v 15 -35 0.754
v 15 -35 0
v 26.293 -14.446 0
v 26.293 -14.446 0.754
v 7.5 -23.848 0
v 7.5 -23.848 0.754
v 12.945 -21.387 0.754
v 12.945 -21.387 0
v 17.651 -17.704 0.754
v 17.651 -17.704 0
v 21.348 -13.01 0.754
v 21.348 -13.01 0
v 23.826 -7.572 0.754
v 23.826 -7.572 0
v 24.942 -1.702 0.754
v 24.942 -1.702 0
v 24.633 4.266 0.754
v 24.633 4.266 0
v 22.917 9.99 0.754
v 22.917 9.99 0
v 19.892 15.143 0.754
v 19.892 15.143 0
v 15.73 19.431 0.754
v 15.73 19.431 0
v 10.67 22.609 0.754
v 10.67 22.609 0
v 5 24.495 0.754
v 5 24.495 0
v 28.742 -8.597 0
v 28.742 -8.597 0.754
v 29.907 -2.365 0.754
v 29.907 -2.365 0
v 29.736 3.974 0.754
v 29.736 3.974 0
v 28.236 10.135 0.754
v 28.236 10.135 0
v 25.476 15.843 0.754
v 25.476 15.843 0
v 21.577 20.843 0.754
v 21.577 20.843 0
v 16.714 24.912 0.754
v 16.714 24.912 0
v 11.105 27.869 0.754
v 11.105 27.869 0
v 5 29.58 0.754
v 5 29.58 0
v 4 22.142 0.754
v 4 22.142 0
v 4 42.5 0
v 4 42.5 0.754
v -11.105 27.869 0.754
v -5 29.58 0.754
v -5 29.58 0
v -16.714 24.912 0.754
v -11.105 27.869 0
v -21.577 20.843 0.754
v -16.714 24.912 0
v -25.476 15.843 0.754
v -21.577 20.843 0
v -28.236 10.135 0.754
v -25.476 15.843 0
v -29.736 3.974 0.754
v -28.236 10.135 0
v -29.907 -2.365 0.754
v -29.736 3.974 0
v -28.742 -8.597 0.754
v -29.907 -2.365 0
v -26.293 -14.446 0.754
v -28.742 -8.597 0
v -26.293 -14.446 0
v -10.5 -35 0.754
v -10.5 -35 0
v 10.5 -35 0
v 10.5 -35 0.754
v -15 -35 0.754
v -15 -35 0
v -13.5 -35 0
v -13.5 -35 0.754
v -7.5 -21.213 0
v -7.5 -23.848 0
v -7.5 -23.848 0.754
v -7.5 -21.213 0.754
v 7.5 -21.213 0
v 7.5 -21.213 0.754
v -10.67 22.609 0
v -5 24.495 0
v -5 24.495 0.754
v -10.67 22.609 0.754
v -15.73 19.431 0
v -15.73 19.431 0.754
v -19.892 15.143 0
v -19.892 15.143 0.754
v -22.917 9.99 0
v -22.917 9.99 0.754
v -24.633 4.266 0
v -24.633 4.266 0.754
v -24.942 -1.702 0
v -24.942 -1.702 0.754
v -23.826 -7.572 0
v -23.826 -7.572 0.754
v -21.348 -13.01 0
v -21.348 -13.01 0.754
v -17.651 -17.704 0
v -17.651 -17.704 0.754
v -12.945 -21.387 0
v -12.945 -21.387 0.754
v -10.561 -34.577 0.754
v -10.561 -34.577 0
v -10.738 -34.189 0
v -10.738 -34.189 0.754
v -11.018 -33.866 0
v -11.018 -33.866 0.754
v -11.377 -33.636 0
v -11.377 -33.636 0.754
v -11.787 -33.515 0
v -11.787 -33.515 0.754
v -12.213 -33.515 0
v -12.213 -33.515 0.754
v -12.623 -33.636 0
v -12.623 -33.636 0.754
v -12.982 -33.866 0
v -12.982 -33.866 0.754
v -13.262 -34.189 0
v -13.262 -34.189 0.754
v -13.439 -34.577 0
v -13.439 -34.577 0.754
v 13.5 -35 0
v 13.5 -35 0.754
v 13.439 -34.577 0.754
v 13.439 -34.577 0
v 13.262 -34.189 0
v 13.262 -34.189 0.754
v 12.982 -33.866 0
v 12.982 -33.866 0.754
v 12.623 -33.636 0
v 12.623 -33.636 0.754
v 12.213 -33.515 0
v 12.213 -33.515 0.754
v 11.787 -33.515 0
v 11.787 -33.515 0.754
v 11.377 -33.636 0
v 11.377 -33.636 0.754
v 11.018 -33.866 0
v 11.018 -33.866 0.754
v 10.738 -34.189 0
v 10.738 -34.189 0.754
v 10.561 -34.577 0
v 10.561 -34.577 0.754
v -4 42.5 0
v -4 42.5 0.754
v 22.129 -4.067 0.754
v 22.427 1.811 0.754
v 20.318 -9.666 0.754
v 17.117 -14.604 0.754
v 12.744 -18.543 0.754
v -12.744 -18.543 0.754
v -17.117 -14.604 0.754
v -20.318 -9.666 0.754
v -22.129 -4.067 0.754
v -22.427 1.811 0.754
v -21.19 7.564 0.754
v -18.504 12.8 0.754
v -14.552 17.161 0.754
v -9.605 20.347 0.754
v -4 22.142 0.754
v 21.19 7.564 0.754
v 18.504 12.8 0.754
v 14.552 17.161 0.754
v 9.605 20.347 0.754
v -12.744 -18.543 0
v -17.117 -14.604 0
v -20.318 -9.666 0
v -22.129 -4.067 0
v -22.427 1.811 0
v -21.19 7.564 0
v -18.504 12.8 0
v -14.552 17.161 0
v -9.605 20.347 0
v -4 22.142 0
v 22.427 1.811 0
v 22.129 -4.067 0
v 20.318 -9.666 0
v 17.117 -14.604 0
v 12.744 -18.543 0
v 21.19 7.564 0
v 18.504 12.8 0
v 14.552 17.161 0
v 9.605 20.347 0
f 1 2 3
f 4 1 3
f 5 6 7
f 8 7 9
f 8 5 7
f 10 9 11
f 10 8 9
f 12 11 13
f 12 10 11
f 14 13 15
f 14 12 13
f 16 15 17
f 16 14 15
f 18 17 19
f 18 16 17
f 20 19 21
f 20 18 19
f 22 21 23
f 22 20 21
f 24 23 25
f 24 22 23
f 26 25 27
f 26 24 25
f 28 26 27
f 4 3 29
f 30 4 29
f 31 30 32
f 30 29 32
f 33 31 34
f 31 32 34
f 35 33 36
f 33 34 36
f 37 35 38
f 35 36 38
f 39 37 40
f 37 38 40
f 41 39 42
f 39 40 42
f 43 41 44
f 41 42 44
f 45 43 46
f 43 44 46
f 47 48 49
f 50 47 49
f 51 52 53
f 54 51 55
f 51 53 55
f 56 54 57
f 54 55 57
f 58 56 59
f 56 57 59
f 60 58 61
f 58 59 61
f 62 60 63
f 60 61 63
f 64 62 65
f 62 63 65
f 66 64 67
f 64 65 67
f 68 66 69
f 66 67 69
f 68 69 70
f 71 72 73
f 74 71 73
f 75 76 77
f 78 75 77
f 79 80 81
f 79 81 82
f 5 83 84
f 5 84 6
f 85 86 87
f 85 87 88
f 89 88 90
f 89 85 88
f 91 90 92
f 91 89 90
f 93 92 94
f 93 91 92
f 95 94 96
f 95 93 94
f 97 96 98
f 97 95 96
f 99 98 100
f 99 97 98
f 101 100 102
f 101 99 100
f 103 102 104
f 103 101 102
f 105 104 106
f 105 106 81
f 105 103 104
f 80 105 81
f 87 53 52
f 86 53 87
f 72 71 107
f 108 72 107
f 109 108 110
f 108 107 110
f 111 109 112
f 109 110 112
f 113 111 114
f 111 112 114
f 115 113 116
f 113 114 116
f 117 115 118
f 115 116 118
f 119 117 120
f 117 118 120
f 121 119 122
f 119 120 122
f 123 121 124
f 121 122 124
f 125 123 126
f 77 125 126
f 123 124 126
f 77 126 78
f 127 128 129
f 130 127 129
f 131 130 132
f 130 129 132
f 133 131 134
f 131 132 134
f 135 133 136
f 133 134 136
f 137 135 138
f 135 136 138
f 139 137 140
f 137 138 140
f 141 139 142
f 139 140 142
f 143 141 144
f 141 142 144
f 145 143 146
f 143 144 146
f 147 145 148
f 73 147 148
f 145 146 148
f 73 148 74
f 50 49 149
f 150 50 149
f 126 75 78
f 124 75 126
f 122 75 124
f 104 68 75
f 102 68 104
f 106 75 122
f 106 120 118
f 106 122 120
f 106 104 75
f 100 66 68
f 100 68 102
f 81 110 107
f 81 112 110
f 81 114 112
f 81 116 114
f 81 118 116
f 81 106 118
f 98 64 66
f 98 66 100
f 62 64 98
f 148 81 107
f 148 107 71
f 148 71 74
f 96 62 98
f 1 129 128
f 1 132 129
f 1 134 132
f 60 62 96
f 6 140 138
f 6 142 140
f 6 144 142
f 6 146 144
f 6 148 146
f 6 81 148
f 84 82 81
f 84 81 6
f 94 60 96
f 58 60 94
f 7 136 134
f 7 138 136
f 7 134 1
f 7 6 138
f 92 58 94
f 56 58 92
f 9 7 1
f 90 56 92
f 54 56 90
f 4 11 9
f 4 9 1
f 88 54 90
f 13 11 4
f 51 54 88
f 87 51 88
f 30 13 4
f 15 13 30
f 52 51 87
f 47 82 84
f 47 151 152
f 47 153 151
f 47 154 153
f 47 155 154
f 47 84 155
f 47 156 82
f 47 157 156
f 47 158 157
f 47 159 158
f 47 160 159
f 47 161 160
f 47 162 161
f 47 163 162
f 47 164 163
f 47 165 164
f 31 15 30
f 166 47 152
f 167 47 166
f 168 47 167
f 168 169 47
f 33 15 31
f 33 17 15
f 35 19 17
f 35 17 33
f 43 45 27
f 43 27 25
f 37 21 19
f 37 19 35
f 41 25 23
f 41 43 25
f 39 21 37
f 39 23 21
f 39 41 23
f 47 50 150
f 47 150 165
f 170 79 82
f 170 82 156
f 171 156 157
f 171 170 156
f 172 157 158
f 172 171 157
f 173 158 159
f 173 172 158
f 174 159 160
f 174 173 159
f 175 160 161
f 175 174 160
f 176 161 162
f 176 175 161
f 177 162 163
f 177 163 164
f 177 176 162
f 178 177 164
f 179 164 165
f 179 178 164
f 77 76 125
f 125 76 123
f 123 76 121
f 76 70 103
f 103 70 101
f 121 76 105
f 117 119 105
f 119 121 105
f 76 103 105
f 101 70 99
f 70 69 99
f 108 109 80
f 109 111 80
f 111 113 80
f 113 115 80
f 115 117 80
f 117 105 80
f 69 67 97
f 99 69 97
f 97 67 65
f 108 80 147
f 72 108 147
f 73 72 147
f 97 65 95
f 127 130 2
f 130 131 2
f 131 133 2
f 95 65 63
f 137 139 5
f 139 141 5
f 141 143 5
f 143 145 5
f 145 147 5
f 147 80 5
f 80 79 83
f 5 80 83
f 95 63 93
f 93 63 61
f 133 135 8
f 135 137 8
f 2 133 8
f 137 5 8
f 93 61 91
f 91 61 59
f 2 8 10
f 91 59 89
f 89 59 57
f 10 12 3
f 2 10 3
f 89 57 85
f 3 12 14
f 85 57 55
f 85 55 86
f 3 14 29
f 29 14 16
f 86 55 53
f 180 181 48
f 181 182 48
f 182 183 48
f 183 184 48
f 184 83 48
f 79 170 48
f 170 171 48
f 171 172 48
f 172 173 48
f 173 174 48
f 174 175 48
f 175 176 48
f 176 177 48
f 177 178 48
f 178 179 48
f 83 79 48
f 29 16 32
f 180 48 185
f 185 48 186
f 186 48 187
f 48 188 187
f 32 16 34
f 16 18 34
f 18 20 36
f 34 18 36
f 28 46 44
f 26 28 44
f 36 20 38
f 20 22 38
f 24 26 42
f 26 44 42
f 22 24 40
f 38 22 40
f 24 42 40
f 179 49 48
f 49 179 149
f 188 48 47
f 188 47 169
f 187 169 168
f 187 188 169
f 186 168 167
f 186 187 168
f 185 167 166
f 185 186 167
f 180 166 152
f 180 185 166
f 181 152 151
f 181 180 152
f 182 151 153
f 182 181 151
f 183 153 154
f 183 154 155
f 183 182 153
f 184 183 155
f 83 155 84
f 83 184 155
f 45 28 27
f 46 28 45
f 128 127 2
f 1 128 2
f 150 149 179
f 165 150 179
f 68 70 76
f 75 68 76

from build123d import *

# Parameters (mm, degrees)
BOSS_EXTRUDE1_DEPTH      = 0.75438
CORTE_EXTRUS_O1_START    = -10
CORTE_EXTRUS_O1_DEPTH    = 10
RESSALTO_EXTRUS_O1_START = -0.75438
RESSALTO_EXTRUS_O1_DEPTH = 0.75438
CORTE_EXTRUS_O2_DEPTH    = 10


with BuildPart() as part:
    # Sketch1 → Boss-Extrude1 (new body)
    with BuildSketch(Plane.XY):
        with BuildLine():
            Line((-15, -35), (15, -35))
            Line((15, -35), (26.292884648, -14.44590658))
            ThreePointArc((26.292884648, -14.44590658), (0, 30), (-26.292884648, -14.44590658))
            Line((-26.292884648, -14.44590658), (-15, -35))
        make_face()
        with BuildLine():
            Line((-7.5, -23.848480035), (-7.5, -21.213203436))
            ThreePointArc((-7.5, -21.213203436), (0, 22.5), (7.5, -21.213203436))
            Line((7.5, -21.213203436), (7.5, -23.848480035))
            ThreePointArc((7.5, -23.848480035), (0, 25), (-7.5, -23.848480035))
        make_face(mode=Mode.SUBTRACT)
    extrude(amount=BOSS_EXTRUDE1_DEPTH)

    # Esboço1 → Corte-extrusão1 (cut)
    with BuildSketch(Plane.XY.offset(0.75438).offset(CORTE_EXTRUS_O1_START)):
        with BuildLine():
            ThreePointArc((-5, 29.580398915), (-2.508787808, 29.894915684), (0, 30))
            ThreePointArc((0, 30), (2.508787808, 29.894915684), (5, 29.580398915))
            Line((5, 29.580398915), (5, 30.901392532))
            Line((5, 30.901392532), (-5, 30.901392532))
            Line((-5, 30.901392532), (-5, 29.580398915))
        make_face()
        with BuildLine():
            Line((0, 27.5), (0, 30))
            ThreePointArc((0, 30), (-2.508787808, 29.894915684), (-5, 29.580398915))
            Line((-5, 29.580398915), (-5, 27.5))
            Line((-5, 27.5), (0, 27.5))
        make_face()
        with BuildLine():
            ThreePointArc((5, 29.580398915), (2.508787808, 29.894915684), (0, 30))
            Line((0, 30), (0, 27.5))
            Line((0, 27.5), (5, 27.5))
            Line((5, 27.5), (5, 29.580398915))
        make_face()
        with BuildLine():
            Line((5, 27.5), (0, 27.5))
            Line((0, 27.5), (0, 25))
            ThreePointArc((0, 25), (2.51272405, 24.873403825), (5, 24.494897428))
            Line((5, 24.494897428), (5, 27.5))
        make_face()
        with BuildLine():
            Line((0, 25), (0, 27.5))
            Line((0, 27.5), (-5, 27.5))
            Line((-5, 27.5), (-5, 24.494897428))
            ThreePointArc((-5, 24.494897428), (-2.51272405, 24.873403825), (0, 25))
        make_face()
        with BuildLine():
            ThreePointArc((5, 24.494897428), (2.51272405, 24.873403825), (0, 25))
            ThreePointArc((0, 25), (-2.51272405, 24.873403825), (-5, 24.494897428))
            Line((-5, 24.494897428), (-5, 24.098607468))
            Line((-5, 24.098607468), (5, 24.098607468))
            Line((5, 24.098607468), (5, 24.494897428))
        make_face()
    extrude(amount=CORTE_EXTRUS_O1_DEPTH, mode=Mode.SUBTRACT)

    # Esboço3 → Ressalto-extrusão1 (add)
    with BuildSketch(Plane.XY.offset(0.75438).offset(RESSALTO_EXTRUS_O1_START)):
        with BuildLine():
            ThreePointArc((-4, 22.141589825), (-2.008012566, 22.410218329), (0, 22.5))
            Line((0, 22.5), (0, 42.5))
            Line((0, 42.5), (-4, 42.5))
            Line((-4, 42.5), (-4, 24.494897428))
            Line((-4, 24.494897428), (-4, 22.141589825))
        make_face()
        with BuildLine():
            Line((0, 42.5), (0, 22.5))
            ThreePointArc((0, 22.5), (2.008012566, 22.410218329), (4, 22.141589825))
            Line((4, 22.141589825), (4, 42.5))
            Line((4, 42.5), (0, 42.5))
        make_face()
    extrude(amount=RESSALTO_EXTRUS_O1_DEPTH)

    # Esboço4 → Corte-extrusão2 (cut)
    with BuildSketch(Plane.XY.offset(0.75438)):
        with BuildLine():
            ThreePointArc((-10.5, -35), (-12, -33.5), (-13.5, -35))
            Line((-13.5, -35), (-12, -35))
            Line((-12, -35), (-10.5, -35))
        make_face()
        with BuildLine():
            Line((-12, -35), (-13.5, -35))
            ThreePointArc((-13.5, -35), (-12, -36.5), (-10.5, -35))
            Line((-10.5, -35), (-12, -35))
        make_face()
        with BuildLine():
            ThreePointArc((13.5, -35), (12, -33.5), (10.5, -35))
            Line((10.5, -35), (13.5, -35))
        make_face()
        with BuildLine():
            Line((13.5, -35), (10.5, -35))
            ThreePointArc((10.5, -35), (12, -36.5), (13.5, -35))
        make_face()
    extrude(amount=-CORTE_EXTRUS_O2_DEPTH, mode=Mode.SUBTRACT)


solid = part.part
